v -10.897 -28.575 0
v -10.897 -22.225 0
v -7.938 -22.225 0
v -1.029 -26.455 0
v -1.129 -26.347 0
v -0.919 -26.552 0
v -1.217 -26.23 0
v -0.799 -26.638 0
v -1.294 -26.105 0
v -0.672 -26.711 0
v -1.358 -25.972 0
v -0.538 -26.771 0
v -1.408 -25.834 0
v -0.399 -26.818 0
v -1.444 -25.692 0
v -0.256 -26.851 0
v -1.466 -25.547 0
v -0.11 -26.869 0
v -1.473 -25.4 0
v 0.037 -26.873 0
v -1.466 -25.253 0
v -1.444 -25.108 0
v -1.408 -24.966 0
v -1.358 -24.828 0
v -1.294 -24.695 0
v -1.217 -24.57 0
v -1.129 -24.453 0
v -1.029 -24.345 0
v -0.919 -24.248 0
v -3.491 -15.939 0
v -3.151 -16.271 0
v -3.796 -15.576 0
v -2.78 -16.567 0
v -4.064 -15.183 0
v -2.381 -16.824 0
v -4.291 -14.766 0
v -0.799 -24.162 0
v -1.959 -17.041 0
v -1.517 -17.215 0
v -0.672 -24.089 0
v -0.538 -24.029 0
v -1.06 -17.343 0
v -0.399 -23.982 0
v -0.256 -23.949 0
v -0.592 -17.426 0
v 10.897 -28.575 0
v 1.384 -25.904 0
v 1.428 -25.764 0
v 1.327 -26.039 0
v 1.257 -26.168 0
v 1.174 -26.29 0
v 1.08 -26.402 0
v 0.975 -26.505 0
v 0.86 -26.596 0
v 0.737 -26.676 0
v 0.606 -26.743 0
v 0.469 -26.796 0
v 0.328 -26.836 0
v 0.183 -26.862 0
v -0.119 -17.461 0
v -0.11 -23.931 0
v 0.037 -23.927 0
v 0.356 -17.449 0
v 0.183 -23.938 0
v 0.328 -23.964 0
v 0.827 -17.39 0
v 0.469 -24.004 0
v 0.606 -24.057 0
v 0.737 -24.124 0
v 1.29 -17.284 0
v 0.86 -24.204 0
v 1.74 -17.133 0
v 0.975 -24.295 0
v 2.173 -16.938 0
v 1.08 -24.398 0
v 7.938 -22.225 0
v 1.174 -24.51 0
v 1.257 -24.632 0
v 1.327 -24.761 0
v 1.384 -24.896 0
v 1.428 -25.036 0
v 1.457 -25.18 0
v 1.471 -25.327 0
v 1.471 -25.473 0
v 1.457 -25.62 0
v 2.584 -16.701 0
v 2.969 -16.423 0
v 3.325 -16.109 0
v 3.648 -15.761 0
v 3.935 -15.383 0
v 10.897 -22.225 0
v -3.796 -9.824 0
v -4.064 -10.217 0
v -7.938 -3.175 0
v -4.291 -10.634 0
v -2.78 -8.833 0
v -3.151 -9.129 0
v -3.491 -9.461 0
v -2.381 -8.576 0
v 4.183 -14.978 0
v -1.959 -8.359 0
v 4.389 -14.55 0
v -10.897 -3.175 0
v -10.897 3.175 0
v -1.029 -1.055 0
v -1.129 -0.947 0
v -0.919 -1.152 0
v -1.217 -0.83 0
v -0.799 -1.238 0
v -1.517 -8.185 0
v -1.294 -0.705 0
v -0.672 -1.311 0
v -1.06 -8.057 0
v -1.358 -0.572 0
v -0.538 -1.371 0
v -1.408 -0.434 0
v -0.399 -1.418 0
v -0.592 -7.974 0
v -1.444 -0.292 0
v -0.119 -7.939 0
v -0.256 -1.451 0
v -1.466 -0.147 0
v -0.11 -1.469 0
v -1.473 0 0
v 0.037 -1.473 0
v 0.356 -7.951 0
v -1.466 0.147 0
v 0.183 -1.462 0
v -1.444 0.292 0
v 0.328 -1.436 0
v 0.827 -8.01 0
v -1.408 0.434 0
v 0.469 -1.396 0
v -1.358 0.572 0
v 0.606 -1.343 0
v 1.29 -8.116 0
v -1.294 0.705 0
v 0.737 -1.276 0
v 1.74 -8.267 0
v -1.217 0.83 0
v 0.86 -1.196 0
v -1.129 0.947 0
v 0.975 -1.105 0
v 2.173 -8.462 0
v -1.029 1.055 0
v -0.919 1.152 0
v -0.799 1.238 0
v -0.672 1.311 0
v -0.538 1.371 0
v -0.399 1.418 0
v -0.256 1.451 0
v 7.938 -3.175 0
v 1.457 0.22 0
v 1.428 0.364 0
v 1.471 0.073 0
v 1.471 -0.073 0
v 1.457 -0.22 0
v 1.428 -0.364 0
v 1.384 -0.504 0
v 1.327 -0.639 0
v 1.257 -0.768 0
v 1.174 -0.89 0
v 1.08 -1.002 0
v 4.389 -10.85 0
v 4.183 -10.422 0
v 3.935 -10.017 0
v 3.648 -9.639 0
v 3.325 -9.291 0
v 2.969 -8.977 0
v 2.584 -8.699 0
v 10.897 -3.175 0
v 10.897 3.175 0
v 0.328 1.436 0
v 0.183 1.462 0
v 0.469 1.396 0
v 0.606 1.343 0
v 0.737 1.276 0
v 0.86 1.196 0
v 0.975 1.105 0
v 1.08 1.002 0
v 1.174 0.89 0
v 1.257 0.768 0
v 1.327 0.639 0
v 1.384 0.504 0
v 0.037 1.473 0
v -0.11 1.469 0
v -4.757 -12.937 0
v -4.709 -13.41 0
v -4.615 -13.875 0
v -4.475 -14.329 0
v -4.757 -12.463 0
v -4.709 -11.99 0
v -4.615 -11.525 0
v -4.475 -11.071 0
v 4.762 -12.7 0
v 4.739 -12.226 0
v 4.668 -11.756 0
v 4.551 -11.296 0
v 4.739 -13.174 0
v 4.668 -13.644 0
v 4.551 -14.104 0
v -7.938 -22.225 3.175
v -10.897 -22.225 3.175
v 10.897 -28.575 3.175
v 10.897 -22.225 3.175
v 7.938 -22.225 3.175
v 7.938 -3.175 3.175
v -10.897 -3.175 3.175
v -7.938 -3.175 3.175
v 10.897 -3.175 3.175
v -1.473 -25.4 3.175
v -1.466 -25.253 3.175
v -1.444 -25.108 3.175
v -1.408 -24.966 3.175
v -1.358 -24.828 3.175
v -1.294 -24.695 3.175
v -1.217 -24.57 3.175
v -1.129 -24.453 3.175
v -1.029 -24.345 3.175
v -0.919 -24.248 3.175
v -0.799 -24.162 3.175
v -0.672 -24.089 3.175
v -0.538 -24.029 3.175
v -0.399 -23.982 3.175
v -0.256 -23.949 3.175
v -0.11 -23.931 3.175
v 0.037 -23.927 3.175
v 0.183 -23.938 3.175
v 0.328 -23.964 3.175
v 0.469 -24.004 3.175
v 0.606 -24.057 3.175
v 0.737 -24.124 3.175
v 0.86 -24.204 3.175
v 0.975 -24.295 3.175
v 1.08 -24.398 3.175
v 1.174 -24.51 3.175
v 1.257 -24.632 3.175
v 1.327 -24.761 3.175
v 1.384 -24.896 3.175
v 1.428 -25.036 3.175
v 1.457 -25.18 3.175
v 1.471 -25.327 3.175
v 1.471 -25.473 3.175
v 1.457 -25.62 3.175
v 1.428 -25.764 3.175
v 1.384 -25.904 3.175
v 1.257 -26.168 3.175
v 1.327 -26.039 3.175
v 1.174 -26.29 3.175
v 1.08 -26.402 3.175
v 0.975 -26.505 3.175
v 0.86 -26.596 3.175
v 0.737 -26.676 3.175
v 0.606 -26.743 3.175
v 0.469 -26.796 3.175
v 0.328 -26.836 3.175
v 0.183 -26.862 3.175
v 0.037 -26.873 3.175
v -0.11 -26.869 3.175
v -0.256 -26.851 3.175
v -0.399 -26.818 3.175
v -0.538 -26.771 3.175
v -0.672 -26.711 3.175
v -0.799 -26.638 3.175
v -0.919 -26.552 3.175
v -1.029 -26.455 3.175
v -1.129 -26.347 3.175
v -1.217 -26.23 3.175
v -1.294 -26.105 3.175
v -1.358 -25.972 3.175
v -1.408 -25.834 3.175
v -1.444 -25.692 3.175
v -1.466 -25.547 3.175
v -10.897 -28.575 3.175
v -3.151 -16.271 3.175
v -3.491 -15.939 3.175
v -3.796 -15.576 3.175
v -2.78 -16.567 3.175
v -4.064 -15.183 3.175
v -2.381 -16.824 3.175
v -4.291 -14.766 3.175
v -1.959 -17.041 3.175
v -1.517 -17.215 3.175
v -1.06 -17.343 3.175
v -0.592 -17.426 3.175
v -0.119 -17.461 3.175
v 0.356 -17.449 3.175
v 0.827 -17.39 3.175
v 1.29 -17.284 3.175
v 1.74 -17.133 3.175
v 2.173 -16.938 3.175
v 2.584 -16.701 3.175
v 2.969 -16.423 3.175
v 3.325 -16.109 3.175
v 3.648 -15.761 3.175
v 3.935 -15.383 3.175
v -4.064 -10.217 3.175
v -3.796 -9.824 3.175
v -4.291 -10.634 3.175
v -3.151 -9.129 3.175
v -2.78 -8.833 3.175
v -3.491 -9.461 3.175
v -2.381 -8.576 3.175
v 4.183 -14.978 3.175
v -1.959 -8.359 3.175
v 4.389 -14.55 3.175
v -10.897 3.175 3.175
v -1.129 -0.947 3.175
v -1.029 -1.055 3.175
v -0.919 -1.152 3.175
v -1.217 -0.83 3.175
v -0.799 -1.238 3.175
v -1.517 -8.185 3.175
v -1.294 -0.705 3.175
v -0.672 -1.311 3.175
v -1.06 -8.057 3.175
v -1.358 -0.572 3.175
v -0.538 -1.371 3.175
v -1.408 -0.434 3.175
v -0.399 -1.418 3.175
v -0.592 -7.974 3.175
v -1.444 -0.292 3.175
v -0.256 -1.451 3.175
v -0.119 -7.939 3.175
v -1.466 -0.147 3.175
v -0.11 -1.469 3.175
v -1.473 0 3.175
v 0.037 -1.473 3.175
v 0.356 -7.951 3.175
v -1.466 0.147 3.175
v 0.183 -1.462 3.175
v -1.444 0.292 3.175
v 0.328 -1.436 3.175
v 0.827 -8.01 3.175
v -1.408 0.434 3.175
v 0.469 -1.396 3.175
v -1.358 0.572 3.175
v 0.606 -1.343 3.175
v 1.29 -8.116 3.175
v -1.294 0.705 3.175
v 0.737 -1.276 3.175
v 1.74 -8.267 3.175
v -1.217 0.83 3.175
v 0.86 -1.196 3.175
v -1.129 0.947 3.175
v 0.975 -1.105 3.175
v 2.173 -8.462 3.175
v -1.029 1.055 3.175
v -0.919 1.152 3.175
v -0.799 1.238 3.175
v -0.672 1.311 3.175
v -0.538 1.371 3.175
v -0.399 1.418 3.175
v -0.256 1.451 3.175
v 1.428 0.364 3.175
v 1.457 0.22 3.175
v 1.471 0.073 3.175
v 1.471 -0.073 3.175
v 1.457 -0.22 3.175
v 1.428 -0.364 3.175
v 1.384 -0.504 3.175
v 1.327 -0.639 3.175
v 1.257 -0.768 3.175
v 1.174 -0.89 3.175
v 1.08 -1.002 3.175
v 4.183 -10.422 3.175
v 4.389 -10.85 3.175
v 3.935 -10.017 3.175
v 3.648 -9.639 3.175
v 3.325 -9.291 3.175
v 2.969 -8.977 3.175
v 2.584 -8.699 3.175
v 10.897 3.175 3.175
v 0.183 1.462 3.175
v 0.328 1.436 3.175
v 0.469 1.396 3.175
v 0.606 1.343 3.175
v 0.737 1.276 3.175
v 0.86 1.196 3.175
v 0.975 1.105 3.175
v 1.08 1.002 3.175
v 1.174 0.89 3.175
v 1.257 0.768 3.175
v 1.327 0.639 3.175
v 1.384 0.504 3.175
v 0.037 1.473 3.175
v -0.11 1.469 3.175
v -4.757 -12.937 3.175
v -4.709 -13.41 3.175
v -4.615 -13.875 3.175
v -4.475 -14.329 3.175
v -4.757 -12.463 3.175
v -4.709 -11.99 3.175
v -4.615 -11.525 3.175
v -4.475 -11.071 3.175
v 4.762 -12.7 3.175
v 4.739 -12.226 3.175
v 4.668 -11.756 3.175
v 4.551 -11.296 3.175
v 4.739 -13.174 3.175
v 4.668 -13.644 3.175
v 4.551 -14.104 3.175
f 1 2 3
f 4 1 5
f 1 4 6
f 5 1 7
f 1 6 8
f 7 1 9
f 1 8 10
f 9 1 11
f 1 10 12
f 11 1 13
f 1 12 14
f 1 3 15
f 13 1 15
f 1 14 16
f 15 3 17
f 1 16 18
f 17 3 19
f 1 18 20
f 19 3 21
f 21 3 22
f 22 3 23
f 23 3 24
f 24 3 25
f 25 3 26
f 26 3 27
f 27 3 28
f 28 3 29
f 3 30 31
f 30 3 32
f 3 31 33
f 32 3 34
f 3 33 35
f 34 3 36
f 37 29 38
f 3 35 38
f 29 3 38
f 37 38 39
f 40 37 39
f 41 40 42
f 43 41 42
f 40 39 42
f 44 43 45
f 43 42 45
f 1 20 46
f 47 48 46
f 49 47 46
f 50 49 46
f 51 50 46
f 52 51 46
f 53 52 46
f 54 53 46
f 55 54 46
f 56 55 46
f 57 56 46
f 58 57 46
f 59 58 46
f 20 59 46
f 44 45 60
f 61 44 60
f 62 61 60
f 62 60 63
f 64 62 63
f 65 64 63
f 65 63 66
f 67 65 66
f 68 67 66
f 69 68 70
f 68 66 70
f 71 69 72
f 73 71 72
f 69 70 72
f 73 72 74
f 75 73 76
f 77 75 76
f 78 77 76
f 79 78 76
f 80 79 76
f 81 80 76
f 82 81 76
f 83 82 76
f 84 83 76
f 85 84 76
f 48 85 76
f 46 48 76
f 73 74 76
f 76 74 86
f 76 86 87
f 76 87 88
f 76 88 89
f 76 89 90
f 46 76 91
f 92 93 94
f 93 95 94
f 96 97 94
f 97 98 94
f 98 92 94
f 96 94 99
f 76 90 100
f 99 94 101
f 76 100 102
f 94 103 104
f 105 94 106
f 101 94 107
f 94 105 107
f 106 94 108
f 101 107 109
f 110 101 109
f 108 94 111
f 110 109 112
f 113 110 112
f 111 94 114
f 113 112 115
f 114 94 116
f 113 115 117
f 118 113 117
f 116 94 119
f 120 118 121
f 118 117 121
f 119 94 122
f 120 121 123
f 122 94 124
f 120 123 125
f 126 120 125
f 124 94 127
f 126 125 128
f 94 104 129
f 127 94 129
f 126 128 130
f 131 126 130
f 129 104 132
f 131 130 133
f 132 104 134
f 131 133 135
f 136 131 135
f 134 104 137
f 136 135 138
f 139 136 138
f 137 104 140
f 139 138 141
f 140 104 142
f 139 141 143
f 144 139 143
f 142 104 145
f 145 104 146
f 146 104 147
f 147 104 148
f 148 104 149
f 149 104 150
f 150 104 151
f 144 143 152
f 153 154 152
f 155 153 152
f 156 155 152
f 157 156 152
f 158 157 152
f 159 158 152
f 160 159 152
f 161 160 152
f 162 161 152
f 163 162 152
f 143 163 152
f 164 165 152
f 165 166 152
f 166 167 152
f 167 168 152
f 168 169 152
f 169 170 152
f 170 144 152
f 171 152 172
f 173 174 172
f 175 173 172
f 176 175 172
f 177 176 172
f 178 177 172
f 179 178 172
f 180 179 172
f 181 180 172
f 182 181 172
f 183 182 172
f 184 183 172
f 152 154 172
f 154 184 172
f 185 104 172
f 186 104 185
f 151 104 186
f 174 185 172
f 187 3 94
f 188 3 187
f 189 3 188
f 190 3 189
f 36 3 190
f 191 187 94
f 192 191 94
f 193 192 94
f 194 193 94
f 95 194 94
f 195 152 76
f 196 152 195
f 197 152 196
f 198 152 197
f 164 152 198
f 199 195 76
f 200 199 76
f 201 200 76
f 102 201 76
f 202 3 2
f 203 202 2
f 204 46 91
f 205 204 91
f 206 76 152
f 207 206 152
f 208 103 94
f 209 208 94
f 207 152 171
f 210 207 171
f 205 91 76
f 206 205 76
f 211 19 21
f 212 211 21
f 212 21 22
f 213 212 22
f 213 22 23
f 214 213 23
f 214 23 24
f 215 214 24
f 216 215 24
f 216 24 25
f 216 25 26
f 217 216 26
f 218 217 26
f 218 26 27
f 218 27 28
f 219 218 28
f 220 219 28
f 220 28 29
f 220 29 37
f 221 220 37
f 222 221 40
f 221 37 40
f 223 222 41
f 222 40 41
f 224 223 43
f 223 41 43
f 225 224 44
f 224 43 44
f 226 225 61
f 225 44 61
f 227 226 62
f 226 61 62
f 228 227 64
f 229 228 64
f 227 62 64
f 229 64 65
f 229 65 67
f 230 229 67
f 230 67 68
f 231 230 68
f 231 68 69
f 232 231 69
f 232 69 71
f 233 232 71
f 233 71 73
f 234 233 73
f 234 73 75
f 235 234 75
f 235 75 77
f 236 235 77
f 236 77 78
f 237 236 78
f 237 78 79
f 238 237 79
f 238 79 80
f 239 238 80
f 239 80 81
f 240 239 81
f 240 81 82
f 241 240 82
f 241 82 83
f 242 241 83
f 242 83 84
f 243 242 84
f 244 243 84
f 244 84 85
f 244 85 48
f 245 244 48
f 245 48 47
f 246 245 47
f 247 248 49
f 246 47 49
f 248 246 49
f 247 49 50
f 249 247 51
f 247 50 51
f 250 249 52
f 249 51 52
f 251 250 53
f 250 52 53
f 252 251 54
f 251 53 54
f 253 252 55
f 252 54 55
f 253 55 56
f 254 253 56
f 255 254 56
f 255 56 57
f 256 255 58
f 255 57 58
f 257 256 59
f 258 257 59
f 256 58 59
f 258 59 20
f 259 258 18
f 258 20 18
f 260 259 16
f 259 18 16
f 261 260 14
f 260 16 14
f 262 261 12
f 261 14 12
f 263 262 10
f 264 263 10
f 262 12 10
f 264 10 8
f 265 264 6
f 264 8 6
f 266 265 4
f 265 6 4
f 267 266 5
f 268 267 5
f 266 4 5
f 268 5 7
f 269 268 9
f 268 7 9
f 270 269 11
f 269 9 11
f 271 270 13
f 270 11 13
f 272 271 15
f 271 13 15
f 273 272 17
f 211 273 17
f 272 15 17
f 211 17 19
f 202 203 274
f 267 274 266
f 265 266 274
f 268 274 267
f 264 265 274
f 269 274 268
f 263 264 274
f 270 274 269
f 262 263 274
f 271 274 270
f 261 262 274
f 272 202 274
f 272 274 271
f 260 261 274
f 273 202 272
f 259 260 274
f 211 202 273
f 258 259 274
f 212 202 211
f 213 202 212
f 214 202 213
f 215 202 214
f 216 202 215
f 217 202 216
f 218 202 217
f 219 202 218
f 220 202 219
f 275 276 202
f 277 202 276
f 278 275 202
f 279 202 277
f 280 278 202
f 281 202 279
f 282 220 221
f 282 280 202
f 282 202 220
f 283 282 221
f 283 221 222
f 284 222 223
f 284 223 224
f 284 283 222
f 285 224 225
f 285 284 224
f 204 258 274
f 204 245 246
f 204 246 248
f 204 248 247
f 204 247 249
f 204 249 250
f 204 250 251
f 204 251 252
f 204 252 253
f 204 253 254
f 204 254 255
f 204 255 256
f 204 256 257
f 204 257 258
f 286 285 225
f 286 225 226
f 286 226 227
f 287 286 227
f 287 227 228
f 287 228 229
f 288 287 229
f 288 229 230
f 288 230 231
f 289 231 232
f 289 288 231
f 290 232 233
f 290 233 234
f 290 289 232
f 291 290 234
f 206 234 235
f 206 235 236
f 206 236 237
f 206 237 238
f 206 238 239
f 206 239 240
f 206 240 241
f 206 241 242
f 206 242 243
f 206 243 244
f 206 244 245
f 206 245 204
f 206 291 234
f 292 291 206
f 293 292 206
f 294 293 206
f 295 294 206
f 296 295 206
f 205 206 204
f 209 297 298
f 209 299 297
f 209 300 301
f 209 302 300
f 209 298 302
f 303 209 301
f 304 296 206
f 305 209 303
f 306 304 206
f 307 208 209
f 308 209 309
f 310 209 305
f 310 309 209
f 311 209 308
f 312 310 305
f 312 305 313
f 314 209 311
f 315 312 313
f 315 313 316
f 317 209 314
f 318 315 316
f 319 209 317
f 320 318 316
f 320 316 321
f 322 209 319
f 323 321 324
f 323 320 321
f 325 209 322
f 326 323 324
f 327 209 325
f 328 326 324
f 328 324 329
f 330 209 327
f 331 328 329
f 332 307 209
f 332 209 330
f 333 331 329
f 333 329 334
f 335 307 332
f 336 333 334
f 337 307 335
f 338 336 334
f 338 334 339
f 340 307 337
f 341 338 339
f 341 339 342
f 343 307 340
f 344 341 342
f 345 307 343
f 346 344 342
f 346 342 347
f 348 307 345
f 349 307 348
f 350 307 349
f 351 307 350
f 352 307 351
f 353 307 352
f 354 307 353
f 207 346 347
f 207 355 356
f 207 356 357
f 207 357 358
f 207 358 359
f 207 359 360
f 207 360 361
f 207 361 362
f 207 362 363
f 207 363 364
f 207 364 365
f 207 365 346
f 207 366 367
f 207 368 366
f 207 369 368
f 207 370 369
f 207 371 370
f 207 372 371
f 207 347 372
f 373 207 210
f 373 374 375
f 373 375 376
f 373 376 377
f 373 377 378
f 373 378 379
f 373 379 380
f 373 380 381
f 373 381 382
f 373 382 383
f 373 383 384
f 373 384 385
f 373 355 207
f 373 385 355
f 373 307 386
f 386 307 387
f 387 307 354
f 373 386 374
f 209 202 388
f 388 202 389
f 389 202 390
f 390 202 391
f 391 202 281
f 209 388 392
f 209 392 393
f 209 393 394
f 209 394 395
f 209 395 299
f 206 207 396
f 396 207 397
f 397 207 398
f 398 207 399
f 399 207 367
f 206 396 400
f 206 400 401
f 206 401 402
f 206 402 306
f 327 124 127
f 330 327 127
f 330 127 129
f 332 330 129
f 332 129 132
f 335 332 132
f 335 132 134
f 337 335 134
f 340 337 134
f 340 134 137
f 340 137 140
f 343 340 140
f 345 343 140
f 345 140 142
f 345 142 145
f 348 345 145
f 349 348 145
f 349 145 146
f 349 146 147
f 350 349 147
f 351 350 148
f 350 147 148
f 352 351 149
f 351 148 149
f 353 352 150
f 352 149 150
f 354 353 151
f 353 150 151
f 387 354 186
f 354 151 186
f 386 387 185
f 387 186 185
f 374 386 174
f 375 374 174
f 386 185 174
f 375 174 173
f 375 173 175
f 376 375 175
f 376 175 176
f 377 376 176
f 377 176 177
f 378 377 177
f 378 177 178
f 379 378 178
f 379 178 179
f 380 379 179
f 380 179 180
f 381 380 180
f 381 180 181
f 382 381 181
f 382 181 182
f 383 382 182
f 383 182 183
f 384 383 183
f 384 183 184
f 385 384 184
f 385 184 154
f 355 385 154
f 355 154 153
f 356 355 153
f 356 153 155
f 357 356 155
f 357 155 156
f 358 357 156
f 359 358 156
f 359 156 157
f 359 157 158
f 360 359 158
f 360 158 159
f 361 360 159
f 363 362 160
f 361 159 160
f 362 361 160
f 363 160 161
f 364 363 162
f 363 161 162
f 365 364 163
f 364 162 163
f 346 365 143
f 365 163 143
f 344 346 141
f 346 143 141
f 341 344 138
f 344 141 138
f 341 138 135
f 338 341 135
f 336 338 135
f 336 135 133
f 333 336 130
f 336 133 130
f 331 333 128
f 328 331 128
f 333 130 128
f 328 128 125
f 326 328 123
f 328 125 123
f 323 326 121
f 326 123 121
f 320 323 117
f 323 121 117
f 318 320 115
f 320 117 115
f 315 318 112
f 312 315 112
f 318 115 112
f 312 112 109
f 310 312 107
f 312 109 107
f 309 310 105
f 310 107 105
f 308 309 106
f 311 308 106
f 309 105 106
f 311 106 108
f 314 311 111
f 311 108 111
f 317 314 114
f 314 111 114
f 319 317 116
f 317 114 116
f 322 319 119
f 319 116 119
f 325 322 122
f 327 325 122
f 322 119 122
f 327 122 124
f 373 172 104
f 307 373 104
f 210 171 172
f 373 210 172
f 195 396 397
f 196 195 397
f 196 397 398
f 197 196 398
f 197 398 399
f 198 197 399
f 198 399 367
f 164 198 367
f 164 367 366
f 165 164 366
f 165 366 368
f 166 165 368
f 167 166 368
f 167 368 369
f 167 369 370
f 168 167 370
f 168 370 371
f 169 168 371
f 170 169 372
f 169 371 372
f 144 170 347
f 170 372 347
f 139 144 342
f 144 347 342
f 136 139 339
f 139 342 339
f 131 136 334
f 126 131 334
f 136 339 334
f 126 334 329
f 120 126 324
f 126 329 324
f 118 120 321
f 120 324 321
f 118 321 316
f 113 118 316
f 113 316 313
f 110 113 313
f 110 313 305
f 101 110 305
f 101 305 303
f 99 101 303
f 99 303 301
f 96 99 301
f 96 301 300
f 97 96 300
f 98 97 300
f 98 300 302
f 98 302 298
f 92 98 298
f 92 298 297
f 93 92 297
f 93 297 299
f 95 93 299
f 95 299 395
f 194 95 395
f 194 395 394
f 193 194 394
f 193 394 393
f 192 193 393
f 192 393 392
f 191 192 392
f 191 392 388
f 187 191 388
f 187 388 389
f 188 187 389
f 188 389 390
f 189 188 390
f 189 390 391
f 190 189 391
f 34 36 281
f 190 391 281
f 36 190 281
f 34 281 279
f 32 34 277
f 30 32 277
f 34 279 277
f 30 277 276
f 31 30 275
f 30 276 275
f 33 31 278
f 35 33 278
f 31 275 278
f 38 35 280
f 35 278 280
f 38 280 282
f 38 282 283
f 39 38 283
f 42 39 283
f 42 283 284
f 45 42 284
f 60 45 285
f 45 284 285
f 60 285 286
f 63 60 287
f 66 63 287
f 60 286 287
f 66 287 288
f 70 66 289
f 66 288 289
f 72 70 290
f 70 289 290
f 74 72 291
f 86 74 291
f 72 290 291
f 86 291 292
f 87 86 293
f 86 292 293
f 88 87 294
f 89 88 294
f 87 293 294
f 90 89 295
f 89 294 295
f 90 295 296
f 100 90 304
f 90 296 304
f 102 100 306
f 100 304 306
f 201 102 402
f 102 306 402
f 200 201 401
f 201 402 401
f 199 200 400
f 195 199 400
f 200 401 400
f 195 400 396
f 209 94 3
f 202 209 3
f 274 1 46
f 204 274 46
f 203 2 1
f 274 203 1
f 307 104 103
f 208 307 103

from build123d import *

# Parameters (mm, degrees)
BOSS_EXTRUDE1_DEPTH       = 3.175
F_4_CLEARANCE_HOLE1_D     = 2.9464
F_4_CLEARANCE_HOLE1_DEPTH = 3.302
F_4_CLEARANCE_HOLE1_TIP   = 0.885187864
CUT_EXTRUDE1_REACH        = 5.175
SKETCH4_R                 = 4.7625


with BuildPart() as part:
    # Sketch1 → Boss-Extrude1 (new body)
    with BuildSketch(Plane.XY):
        Polygon((7.9375, -3.175), (10.8966, -3.175), (10.8966, 3.175), (-10.8966, 3.175), (-10.8966, -3.175), (-7.9375, -3.175), (-7.9375, -22.225), (-10.8966, -22.225), (-10.8966, -28.575), (10.8966, -28.575), (10.8966, -22.225), (7.9375, -22.225), align=None)
    extrude(amount=BOSS_EXTRUDE1_DEPTH)

    # #4 Clearance Hole1
    with Locations(Plane.XY.offset(3.175)):
        with Locations((0, 0), (0, -25.4)):
            Hole(F_4_CLEARANCE_HOLE1_D / 2, depth=F_4_CLEARANCE_HOLE1_DEPTH)
            with Locations((0, 0, -(F_4_CLEARANCE_HOLE1_DEPTH + F_4_CLEARANCE_HOLE1_TIP / 2))):  # 118° drill point
                Cone(0, F_4_CLEARANCE_HOLE1_D / 2, F_4_CLEARANCE_HOLE1_TIP, mode=Mode.SUBTRACT)

    # Sketch4 → Cut-Extrude1 (cut, up to next)
    with BuildSketch(Plane.XY.offset(3.175), mode=Mode.PRIVATE) as cut_extrude1_sk1:
        with Locations((0, -12.7)):
            Circle(SKETCH4_R)
    cut_extrude1_tool1 = extrude(cut_extrude1_sk1.sketch, amount=-CUT_EXTRUDE1_REACH, mode=Mode.PRIVATE) & part.part
    add(cut_extrude1_tool1.solids().sort_by_distance((0, -12.7, 3.175))[0], mode=Mode.SUBTRACT)


solid = part.part
